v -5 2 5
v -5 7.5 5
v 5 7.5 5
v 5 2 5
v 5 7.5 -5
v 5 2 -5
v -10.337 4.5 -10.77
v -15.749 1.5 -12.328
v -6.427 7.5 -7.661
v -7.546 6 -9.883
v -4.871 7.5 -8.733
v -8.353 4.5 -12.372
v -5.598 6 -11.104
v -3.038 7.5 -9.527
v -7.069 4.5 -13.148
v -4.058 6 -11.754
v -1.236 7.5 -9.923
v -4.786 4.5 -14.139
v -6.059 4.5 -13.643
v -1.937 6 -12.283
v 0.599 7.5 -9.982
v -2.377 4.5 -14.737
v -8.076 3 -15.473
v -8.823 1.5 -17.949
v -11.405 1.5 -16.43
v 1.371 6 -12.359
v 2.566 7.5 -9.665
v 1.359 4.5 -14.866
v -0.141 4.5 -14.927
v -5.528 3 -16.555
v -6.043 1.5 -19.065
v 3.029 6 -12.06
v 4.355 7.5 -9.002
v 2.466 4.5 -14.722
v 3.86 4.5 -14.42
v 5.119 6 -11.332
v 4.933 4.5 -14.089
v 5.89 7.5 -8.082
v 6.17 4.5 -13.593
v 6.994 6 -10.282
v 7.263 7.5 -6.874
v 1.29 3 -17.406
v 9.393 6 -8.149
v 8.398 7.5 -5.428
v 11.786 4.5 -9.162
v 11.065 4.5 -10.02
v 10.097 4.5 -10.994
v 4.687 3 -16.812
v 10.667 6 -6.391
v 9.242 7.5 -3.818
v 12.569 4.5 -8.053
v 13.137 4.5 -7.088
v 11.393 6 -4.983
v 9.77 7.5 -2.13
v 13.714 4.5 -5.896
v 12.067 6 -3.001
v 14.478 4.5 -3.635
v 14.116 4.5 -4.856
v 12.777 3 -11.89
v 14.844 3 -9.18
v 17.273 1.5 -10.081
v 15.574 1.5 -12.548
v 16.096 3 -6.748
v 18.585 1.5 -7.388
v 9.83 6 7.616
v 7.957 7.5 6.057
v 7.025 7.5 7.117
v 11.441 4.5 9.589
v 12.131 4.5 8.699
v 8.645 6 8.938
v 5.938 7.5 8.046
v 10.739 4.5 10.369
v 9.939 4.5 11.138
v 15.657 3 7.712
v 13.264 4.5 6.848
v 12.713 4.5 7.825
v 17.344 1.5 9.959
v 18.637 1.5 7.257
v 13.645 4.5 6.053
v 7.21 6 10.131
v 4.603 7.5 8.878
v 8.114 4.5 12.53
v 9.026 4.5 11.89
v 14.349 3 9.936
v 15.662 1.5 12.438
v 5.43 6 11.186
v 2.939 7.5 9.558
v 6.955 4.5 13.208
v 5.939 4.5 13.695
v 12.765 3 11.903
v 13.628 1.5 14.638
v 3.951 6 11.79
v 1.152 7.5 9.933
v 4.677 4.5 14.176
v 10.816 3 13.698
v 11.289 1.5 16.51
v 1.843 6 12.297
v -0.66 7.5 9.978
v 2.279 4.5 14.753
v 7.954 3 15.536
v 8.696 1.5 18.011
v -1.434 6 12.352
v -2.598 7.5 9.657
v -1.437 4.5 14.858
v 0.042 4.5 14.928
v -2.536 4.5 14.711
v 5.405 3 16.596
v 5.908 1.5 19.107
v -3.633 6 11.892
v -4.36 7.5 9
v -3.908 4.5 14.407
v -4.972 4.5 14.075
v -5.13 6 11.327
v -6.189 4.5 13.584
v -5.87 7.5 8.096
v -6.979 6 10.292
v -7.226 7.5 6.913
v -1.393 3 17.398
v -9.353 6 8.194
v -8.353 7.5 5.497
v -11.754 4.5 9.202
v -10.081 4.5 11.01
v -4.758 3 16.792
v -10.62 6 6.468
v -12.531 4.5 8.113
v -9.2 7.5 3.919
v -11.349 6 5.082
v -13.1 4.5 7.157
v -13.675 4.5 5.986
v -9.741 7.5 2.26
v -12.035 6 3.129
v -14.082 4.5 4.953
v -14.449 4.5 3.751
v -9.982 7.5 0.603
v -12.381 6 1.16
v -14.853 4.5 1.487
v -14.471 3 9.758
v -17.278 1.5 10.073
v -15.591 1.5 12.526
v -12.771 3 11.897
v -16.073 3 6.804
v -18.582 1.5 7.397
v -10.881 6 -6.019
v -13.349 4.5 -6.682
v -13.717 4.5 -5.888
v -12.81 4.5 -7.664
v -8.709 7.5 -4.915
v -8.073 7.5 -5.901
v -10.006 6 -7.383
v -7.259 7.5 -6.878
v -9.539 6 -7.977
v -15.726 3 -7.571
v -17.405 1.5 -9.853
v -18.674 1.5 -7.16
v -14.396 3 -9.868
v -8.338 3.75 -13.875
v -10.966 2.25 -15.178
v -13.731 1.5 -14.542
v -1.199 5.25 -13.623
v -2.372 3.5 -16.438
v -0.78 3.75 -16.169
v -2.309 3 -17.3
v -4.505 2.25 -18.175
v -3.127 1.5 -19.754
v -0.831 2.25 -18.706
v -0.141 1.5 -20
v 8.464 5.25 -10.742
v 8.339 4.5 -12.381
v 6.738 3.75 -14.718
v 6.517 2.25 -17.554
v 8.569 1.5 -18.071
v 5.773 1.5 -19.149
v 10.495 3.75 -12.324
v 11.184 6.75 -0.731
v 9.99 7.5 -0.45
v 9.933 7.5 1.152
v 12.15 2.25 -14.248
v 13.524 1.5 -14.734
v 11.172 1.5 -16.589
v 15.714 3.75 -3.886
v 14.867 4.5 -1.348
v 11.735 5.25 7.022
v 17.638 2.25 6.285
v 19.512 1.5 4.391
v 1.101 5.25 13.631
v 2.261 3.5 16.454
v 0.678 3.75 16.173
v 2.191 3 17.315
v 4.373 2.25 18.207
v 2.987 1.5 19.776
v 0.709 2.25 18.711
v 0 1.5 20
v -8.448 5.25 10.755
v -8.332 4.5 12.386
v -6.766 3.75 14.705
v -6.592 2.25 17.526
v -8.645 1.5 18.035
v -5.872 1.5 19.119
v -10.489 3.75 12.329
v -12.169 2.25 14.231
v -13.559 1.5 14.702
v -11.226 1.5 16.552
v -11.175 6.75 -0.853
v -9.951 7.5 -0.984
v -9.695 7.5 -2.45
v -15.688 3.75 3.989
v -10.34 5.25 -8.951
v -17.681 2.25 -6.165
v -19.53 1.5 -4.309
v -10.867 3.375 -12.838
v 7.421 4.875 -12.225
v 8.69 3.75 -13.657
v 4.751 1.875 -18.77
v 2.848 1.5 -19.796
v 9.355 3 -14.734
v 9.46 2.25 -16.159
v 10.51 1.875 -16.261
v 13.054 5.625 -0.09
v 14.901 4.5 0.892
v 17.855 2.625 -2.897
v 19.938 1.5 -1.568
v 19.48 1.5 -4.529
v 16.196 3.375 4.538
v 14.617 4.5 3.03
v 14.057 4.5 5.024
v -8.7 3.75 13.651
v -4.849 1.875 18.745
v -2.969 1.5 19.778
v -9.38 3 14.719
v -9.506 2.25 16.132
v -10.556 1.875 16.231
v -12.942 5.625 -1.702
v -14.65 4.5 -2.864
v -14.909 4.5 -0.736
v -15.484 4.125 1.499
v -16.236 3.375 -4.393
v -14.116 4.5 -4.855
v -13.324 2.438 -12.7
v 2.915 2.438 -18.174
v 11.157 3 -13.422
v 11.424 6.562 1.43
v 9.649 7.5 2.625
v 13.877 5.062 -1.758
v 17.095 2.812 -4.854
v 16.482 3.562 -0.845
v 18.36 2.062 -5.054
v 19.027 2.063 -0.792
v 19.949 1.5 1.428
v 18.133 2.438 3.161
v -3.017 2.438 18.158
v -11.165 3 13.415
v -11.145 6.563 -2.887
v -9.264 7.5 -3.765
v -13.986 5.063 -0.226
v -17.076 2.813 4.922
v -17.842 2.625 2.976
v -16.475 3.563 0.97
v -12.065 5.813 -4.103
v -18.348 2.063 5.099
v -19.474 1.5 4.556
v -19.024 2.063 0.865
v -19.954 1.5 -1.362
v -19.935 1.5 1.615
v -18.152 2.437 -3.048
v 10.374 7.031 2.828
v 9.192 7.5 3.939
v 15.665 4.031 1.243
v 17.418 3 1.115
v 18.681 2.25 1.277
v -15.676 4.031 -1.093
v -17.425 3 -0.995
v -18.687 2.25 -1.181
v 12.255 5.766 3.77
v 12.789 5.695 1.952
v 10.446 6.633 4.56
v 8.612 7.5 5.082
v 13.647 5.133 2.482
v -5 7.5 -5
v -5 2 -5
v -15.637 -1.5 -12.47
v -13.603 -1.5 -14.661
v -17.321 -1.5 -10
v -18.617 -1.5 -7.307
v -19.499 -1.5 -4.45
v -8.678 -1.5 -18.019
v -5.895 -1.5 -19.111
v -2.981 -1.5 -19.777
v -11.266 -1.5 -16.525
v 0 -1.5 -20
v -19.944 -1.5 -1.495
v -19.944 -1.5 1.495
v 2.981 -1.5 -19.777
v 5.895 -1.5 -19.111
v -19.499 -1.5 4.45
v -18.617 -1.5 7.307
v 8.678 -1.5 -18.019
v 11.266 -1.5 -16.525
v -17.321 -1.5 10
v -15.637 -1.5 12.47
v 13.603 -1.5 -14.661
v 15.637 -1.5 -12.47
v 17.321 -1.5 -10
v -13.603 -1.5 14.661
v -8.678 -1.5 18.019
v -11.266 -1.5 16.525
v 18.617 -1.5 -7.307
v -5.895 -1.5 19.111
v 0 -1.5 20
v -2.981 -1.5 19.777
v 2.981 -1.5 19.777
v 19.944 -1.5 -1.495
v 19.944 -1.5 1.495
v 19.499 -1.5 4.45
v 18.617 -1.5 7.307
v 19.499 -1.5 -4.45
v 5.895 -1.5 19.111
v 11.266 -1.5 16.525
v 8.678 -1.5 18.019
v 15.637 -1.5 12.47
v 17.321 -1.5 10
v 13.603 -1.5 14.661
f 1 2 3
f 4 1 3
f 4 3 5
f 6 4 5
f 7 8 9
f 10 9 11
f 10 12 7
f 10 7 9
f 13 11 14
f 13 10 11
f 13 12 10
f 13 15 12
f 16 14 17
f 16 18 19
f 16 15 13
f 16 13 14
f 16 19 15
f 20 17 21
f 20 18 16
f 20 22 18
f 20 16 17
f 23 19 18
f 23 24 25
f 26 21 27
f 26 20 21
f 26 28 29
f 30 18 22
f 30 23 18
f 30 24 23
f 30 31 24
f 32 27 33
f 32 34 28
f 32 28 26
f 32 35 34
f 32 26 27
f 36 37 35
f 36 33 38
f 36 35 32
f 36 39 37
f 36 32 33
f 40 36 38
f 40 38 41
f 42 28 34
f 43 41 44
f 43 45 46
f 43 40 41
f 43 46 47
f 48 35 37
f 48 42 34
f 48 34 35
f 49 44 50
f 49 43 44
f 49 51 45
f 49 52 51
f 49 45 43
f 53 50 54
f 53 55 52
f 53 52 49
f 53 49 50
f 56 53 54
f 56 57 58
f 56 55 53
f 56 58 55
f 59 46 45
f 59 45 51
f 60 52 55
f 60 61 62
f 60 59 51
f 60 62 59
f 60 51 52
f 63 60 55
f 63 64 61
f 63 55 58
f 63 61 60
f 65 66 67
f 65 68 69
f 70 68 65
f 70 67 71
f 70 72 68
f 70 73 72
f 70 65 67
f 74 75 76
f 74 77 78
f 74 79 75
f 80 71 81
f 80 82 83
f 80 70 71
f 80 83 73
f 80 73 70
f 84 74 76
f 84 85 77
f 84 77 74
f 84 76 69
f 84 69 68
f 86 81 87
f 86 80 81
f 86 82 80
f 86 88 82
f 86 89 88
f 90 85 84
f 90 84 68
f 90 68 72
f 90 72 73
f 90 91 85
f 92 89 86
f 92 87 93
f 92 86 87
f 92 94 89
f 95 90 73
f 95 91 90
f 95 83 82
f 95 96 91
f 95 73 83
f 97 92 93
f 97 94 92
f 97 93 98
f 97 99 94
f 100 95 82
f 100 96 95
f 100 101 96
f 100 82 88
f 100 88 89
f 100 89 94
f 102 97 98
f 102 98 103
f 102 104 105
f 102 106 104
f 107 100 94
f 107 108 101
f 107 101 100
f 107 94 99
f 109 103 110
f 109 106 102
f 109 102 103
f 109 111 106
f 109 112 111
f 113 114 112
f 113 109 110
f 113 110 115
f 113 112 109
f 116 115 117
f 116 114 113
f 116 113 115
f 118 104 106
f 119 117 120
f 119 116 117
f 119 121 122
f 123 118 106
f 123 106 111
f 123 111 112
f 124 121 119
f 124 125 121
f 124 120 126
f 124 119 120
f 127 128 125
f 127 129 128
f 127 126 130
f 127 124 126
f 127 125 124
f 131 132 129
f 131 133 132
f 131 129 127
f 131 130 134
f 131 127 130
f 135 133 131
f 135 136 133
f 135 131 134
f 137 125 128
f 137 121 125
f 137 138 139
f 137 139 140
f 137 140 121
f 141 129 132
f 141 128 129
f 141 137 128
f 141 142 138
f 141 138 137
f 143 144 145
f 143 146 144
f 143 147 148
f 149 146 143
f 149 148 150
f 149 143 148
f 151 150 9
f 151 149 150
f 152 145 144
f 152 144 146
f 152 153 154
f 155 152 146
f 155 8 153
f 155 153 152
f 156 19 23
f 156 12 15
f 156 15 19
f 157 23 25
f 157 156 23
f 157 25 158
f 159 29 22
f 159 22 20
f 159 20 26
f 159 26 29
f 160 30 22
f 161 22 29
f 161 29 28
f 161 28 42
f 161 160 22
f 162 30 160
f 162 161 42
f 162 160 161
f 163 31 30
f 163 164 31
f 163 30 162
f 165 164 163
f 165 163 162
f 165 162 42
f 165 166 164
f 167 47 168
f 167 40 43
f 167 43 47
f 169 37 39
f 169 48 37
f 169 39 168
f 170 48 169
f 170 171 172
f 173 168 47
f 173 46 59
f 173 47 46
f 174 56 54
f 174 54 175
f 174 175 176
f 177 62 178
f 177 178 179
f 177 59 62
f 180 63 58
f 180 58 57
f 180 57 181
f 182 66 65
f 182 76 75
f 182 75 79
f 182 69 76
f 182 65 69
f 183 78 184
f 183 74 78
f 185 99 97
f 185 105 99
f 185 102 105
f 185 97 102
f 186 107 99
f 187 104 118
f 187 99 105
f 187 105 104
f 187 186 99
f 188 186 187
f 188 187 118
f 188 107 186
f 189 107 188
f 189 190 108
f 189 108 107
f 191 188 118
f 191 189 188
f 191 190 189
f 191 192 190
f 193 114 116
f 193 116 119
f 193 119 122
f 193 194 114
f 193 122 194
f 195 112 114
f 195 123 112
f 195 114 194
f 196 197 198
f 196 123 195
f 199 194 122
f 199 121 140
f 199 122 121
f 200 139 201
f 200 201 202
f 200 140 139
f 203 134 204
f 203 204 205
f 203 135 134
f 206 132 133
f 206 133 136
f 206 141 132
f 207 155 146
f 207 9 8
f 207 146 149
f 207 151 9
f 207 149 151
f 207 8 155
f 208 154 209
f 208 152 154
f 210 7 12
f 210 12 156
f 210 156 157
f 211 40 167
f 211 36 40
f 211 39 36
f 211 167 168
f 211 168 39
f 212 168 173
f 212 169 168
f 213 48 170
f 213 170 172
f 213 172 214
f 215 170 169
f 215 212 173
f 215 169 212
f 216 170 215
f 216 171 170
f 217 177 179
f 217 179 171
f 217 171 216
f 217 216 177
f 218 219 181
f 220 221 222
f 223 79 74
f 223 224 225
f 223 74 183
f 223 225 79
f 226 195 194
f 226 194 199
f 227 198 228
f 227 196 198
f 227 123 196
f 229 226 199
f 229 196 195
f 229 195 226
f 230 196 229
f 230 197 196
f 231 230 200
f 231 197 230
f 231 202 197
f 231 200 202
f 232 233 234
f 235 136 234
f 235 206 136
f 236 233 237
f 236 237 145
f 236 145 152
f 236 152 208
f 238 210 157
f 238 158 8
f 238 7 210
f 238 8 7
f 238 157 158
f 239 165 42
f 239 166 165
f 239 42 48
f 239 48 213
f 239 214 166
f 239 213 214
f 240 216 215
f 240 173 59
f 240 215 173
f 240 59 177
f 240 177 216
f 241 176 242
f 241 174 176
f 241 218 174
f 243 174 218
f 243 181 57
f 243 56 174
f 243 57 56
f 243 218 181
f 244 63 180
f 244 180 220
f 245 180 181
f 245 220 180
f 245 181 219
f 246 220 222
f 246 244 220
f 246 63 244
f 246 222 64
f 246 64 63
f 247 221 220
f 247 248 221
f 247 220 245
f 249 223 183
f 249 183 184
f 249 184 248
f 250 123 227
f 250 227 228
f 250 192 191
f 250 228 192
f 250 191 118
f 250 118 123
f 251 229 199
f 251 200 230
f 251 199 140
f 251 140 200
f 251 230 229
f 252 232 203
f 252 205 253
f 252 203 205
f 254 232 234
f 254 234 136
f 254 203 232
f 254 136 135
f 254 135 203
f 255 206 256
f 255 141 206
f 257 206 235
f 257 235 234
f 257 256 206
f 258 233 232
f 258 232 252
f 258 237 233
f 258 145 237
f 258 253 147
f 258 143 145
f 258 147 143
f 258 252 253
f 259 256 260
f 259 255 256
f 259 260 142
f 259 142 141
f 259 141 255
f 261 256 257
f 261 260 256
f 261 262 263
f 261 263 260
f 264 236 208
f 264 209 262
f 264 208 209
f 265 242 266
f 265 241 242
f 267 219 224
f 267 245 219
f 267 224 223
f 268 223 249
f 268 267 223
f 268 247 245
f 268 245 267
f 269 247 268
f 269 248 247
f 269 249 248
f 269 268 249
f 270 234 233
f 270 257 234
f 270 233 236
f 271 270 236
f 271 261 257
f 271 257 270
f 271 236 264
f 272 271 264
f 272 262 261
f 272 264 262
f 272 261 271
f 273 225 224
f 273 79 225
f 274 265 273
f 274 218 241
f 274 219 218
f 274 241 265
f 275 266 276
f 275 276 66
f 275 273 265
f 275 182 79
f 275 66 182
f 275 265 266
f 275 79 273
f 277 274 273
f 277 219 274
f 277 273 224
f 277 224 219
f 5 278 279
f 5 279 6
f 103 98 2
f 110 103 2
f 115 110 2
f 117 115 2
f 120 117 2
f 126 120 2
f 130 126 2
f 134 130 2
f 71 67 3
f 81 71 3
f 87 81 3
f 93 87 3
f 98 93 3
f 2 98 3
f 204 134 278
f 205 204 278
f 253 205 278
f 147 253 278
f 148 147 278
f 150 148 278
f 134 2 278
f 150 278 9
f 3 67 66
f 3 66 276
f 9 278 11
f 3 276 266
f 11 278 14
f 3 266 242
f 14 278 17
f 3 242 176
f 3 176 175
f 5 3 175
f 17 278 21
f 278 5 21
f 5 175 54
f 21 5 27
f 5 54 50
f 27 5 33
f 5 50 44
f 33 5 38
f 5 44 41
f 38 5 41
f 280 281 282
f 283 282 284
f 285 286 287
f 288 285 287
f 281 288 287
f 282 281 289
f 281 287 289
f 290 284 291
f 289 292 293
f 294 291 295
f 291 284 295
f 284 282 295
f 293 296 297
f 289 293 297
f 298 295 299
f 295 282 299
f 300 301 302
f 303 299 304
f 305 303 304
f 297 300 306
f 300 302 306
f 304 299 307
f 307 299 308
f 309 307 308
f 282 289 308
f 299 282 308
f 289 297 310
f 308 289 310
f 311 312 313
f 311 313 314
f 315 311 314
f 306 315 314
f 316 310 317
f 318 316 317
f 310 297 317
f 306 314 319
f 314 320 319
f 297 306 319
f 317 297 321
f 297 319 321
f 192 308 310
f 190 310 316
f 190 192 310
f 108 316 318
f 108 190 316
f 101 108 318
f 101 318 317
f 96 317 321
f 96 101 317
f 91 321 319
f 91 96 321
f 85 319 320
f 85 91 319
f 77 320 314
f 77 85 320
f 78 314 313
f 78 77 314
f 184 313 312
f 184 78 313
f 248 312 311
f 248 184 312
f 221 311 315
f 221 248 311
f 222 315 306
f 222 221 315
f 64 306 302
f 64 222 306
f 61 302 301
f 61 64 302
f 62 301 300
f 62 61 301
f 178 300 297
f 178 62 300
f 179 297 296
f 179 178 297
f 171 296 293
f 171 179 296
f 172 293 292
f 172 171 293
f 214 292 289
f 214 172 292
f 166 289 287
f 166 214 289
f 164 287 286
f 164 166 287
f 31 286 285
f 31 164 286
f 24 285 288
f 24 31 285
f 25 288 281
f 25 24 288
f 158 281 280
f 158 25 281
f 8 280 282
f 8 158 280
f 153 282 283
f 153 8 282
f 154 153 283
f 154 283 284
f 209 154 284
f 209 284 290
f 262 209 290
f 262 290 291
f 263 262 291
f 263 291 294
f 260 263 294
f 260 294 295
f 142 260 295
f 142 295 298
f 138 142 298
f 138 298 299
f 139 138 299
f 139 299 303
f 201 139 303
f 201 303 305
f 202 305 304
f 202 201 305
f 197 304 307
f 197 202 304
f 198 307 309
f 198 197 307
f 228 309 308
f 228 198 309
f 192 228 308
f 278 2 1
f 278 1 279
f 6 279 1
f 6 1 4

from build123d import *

# Parameters (mm, degrees)
SKETCH1_R           = 20
BOSS_EXTRUDE1_DEPTH = 1.5
SKETCH5_W           = 10
SKETCH5_H           = 10
CUT_EXTRUDE1_DEPTH  = 5.5


with BuildPart() as part:
    # Sketch1 → Boss-Extrude1 (new, symmetric)
    with BuildSketch(Plane(origin=(0, 0, 0), x_dir=(1, 0, 0), z_dir=(0, 1, 0))):
        with Locations(Location((0, 0, 0), (0, 0, 270))):
            Circle(SKETCH1_R)
    extrude(amount=BOSS_EXTRUDE1_DEPTH, both=True)

    # Loft1: read off the stored shape, not the designer's step
    # Loft1: loft between two sections, ruled curve by curve
    loft1_from = [
        Edge.make_bspline([(-6.427341281, 7.5, -7.660893163), (8.894445045, 7.5, -20.515575726), (21.749127607, 7.5, -5.1937894), (6.427341281, 7.5, 7.660893163), (-8.894445045, 7.5, 20.515575726), (-21.749127607, 7.5, 5.1937894), (-6.427341281, 7.5, -7.660893163)], [0, 0, 0, 0, 0.5, 0.5, 0.5, 1, 1, 1, 1], 3, [1, 0.333333333, 0.333333333, 1, 0.333333333, 0.333333333, 1]),
    ]
    loft1_to = [
        Edge.make_bspline([(-15.74903345, 1.5, -12.327527951), (8.906022452, 1.5, -43.825594852), (40.404089352, 1.5, -19.17053895), (15.74903345, 1.5, 12.327527951), (-8.906022452, 1.5, 43.825594852), (-40.404089352, 1.5, 19.17053895), (-15.74903345, 1.5, -12.327527951)], [0, 0, 0, 0, 0.5, 0.5, 0.5, 1, 1, 1, 1], 3, [1, 0.333333333, 0.333333333, 1, 0.333333333, 0.333333333, 1]),
    ]
    loft1 = Solid(Shell([*[Face.make_surface_from_curves(loft1_from[k], loft1_to[k]) for k in range(1)], Face(Wire(loft1_from)), Face(Wire(loft1_to))]))
    add(loft1)

    # Sketch5 → Cut-Extrude1 (cut)
    with BuildSketch(Plane(origin=(0, 7.5, 0), x_dir=(1, 0, 0), z_dir=(0, 1, 0))):
        Rectangle(SKETCH5_W, SKETCH5_H)
    extrude(amount=-CUT_EXTRUDE1_DEPTH, mode=Mode.SUBTRACT)


solid = part.part
